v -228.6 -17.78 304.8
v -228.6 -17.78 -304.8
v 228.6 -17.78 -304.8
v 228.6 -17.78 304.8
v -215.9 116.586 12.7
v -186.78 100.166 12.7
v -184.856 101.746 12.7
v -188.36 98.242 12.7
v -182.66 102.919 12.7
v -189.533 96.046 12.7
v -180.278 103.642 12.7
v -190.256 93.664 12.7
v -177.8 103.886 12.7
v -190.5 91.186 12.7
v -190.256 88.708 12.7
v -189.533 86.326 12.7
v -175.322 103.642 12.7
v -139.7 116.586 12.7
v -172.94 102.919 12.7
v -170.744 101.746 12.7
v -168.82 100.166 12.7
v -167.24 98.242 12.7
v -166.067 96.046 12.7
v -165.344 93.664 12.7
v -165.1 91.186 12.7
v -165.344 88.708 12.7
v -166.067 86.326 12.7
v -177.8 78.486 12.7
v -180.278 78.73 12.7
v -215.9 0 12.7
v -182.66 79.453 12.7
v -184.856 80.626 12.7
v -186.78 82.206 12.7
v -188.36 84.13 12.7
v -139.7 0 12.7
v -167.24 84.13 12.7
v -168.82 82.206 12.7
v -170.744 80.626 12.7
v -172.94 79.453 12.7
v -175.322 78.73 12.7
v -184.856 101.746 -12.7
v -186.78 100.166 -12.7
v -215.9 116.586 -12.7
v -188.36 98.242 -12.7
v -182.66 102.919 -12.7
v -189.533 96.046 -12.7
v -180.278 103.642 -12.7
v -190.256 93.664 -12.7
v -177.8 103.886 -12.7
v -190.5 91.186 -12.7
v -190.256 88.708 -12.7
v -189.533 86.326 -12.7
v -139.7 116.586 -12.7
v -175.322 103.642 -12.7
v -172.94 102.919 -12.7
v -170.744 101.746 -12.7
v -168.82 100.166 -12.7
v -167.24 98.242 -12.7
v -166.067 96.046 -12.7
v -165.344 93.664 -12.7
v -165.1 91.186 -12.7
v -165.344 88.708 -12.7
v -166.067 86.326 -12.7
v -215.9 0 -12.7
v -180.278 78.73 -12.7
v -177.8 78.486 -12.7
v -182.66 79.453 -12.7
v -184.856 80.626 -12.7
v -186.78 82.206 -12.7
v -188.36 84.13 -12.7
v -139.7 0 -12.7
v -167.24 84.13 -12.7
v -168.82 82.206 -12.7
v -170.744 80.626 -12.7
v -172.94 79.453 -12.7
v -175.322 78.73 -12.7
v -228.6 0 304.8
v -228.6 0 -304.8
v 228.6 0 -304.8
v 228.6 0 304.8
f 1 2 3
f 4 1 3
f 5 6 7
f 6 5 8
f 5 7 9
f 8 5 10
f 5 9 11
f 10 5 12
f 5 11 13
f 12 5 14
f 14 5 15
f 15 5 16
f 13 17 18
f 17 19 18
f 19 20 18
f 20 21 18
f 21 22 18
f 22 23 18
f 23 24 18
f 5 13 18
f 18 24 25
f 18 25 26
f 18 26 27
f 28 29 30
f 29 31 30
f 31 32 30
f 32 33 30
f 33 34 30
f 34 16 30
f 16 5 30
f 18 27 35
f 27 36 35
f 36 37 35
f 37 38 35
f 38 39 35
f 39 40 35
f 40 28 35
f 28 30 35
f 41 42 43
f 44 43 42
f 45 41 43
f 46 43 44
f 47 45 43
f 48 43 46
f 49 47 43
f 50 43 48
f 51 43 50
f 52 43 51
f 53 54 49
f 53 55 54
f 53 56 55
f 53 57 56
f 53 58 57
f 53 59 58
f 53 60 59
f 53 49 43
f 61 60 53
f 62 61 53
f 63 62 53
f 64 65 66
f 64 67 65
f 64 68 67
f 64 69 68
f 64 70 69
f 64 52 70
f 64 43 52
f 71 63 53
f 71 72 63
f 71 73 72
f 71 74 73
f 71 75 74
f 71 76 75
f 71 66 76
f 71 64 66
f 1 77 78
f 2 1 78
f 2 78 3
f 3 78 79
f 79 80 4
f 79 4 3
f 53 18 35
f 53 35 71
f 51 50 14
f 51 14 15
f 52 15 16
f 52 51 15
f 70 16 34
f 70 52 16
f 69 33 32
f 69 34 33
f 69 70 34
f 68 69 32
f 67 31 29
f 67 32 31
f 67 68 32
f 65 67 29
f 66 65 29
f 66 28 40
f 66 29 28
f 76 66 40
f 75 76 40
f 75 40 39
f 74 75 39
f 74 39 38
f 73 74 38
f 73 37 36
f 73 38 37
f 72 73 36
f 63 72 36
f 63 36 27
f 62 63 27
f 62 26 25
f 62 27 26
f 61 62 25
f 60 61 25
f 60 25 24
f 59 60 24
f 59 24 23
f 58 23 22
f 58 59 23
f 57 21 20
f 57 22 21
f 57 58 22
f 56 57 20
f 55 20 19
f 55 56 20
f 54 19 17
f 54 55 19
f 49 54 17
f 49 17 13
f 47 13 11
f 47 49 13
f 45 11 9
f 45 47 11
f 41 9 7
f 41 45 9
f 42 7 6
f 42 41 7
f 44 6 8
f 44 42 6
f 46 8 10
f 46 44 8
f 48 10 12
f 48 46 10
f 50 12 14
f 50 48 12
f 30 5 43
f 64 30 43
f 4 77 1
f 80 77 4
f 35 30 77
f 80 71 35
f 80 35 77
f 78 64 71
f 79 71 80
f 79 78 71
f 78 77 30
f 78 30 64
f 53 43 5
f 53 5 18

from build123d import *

# Parameters (mm, degrees)
SKETCH2_W               = 457.2
SKETCH2_H               = 609.6
SKETCH2_W_2             = 76.2
SKETCH2_H_2             = 25.4
BOSS_EXTRUDE1_DEPTH     = 17.78
SKETCH3_W               = 76.2
SKETCH3_H               = 25.4
BOSS_EXTRUDE2_DEPTH     = 116.586
SKETCH3_2_W             = 76.2
SKETCH3_2_H             = 25.4
BOSS_EXTRUDE3_DEPTH     = 17.78
CUT_EXTRUDE1_DEPTH      = 254
CUT_EXTRUDE1_DEPTH_BACK = 254
SKETCH4_R               = 12.7


with BuildPart() as part:
    # Sketch2 → Boss-Extrude1 (new body)
    with BuildSketch(Plane(origin=(0, 0, 0), x_dir=(1, 0, 0), z_dir=(0, 1, 0))):
        Rectangle(SKETCH2_W, SKETCH2_H)
        with Locations((-177.8, 0)):
            Rectangle(SKETCH2_W_2, SKETCH2_H_2, mode=Mode.SUBTRACT)
    extrude(amount=-BOSS_EXTRUDE1_DEPTH)



with BuildPart() as body_2:
    # Sketch3 → Boss-Extrude2 (new body)
    with BuildSketch(Plane(origin=(0, 0, 0), x_dir=(1, 0, 0), z_dir=(0, 1, 0))):
        with Locations((-177.8, 0)):
            Rectangle(SKETCH3_W, SKETCH3_H)
    extrude(amount=BOSS_EXTRUDE2_DEPTH)


with BuildPart() as part_1:
    add(part.part)

    add(body_2.part)  # Boss-Extrude3 merges body 2
    # Sketch3<2> → Boss-Extrude3 (add)
    with BuildSketch(Plane(origin=(0, 0, 0), x_dir=(1, 0, 0), z_dir=(0, 1, 0))):
        with Locations((-177.8, 0)):
            Rectangle(SKETCH3_2_W, SKETCH3_2_H)
    extrude(amount=-BOSS_EXTRUDE3_DEPTH)

    # Sketch4 → Cut-Extrude1 (cut, two sides: drawn at the far end of the back side and taken through both)
    with BuildSketch(Plane.XY.offset(-CUT_EXTRUDE1_DEPTH_BACK)):
        with Locations((-177.8, 91.186)):
            Circle(SKETCH4_R)
    extrude(amount=CUT_EXTRUDE1_DEPTH + CUT_EXTRUDE1_DEPTH_BACK, mode=Mode.SUBTRACT)


solid = part_1.part
